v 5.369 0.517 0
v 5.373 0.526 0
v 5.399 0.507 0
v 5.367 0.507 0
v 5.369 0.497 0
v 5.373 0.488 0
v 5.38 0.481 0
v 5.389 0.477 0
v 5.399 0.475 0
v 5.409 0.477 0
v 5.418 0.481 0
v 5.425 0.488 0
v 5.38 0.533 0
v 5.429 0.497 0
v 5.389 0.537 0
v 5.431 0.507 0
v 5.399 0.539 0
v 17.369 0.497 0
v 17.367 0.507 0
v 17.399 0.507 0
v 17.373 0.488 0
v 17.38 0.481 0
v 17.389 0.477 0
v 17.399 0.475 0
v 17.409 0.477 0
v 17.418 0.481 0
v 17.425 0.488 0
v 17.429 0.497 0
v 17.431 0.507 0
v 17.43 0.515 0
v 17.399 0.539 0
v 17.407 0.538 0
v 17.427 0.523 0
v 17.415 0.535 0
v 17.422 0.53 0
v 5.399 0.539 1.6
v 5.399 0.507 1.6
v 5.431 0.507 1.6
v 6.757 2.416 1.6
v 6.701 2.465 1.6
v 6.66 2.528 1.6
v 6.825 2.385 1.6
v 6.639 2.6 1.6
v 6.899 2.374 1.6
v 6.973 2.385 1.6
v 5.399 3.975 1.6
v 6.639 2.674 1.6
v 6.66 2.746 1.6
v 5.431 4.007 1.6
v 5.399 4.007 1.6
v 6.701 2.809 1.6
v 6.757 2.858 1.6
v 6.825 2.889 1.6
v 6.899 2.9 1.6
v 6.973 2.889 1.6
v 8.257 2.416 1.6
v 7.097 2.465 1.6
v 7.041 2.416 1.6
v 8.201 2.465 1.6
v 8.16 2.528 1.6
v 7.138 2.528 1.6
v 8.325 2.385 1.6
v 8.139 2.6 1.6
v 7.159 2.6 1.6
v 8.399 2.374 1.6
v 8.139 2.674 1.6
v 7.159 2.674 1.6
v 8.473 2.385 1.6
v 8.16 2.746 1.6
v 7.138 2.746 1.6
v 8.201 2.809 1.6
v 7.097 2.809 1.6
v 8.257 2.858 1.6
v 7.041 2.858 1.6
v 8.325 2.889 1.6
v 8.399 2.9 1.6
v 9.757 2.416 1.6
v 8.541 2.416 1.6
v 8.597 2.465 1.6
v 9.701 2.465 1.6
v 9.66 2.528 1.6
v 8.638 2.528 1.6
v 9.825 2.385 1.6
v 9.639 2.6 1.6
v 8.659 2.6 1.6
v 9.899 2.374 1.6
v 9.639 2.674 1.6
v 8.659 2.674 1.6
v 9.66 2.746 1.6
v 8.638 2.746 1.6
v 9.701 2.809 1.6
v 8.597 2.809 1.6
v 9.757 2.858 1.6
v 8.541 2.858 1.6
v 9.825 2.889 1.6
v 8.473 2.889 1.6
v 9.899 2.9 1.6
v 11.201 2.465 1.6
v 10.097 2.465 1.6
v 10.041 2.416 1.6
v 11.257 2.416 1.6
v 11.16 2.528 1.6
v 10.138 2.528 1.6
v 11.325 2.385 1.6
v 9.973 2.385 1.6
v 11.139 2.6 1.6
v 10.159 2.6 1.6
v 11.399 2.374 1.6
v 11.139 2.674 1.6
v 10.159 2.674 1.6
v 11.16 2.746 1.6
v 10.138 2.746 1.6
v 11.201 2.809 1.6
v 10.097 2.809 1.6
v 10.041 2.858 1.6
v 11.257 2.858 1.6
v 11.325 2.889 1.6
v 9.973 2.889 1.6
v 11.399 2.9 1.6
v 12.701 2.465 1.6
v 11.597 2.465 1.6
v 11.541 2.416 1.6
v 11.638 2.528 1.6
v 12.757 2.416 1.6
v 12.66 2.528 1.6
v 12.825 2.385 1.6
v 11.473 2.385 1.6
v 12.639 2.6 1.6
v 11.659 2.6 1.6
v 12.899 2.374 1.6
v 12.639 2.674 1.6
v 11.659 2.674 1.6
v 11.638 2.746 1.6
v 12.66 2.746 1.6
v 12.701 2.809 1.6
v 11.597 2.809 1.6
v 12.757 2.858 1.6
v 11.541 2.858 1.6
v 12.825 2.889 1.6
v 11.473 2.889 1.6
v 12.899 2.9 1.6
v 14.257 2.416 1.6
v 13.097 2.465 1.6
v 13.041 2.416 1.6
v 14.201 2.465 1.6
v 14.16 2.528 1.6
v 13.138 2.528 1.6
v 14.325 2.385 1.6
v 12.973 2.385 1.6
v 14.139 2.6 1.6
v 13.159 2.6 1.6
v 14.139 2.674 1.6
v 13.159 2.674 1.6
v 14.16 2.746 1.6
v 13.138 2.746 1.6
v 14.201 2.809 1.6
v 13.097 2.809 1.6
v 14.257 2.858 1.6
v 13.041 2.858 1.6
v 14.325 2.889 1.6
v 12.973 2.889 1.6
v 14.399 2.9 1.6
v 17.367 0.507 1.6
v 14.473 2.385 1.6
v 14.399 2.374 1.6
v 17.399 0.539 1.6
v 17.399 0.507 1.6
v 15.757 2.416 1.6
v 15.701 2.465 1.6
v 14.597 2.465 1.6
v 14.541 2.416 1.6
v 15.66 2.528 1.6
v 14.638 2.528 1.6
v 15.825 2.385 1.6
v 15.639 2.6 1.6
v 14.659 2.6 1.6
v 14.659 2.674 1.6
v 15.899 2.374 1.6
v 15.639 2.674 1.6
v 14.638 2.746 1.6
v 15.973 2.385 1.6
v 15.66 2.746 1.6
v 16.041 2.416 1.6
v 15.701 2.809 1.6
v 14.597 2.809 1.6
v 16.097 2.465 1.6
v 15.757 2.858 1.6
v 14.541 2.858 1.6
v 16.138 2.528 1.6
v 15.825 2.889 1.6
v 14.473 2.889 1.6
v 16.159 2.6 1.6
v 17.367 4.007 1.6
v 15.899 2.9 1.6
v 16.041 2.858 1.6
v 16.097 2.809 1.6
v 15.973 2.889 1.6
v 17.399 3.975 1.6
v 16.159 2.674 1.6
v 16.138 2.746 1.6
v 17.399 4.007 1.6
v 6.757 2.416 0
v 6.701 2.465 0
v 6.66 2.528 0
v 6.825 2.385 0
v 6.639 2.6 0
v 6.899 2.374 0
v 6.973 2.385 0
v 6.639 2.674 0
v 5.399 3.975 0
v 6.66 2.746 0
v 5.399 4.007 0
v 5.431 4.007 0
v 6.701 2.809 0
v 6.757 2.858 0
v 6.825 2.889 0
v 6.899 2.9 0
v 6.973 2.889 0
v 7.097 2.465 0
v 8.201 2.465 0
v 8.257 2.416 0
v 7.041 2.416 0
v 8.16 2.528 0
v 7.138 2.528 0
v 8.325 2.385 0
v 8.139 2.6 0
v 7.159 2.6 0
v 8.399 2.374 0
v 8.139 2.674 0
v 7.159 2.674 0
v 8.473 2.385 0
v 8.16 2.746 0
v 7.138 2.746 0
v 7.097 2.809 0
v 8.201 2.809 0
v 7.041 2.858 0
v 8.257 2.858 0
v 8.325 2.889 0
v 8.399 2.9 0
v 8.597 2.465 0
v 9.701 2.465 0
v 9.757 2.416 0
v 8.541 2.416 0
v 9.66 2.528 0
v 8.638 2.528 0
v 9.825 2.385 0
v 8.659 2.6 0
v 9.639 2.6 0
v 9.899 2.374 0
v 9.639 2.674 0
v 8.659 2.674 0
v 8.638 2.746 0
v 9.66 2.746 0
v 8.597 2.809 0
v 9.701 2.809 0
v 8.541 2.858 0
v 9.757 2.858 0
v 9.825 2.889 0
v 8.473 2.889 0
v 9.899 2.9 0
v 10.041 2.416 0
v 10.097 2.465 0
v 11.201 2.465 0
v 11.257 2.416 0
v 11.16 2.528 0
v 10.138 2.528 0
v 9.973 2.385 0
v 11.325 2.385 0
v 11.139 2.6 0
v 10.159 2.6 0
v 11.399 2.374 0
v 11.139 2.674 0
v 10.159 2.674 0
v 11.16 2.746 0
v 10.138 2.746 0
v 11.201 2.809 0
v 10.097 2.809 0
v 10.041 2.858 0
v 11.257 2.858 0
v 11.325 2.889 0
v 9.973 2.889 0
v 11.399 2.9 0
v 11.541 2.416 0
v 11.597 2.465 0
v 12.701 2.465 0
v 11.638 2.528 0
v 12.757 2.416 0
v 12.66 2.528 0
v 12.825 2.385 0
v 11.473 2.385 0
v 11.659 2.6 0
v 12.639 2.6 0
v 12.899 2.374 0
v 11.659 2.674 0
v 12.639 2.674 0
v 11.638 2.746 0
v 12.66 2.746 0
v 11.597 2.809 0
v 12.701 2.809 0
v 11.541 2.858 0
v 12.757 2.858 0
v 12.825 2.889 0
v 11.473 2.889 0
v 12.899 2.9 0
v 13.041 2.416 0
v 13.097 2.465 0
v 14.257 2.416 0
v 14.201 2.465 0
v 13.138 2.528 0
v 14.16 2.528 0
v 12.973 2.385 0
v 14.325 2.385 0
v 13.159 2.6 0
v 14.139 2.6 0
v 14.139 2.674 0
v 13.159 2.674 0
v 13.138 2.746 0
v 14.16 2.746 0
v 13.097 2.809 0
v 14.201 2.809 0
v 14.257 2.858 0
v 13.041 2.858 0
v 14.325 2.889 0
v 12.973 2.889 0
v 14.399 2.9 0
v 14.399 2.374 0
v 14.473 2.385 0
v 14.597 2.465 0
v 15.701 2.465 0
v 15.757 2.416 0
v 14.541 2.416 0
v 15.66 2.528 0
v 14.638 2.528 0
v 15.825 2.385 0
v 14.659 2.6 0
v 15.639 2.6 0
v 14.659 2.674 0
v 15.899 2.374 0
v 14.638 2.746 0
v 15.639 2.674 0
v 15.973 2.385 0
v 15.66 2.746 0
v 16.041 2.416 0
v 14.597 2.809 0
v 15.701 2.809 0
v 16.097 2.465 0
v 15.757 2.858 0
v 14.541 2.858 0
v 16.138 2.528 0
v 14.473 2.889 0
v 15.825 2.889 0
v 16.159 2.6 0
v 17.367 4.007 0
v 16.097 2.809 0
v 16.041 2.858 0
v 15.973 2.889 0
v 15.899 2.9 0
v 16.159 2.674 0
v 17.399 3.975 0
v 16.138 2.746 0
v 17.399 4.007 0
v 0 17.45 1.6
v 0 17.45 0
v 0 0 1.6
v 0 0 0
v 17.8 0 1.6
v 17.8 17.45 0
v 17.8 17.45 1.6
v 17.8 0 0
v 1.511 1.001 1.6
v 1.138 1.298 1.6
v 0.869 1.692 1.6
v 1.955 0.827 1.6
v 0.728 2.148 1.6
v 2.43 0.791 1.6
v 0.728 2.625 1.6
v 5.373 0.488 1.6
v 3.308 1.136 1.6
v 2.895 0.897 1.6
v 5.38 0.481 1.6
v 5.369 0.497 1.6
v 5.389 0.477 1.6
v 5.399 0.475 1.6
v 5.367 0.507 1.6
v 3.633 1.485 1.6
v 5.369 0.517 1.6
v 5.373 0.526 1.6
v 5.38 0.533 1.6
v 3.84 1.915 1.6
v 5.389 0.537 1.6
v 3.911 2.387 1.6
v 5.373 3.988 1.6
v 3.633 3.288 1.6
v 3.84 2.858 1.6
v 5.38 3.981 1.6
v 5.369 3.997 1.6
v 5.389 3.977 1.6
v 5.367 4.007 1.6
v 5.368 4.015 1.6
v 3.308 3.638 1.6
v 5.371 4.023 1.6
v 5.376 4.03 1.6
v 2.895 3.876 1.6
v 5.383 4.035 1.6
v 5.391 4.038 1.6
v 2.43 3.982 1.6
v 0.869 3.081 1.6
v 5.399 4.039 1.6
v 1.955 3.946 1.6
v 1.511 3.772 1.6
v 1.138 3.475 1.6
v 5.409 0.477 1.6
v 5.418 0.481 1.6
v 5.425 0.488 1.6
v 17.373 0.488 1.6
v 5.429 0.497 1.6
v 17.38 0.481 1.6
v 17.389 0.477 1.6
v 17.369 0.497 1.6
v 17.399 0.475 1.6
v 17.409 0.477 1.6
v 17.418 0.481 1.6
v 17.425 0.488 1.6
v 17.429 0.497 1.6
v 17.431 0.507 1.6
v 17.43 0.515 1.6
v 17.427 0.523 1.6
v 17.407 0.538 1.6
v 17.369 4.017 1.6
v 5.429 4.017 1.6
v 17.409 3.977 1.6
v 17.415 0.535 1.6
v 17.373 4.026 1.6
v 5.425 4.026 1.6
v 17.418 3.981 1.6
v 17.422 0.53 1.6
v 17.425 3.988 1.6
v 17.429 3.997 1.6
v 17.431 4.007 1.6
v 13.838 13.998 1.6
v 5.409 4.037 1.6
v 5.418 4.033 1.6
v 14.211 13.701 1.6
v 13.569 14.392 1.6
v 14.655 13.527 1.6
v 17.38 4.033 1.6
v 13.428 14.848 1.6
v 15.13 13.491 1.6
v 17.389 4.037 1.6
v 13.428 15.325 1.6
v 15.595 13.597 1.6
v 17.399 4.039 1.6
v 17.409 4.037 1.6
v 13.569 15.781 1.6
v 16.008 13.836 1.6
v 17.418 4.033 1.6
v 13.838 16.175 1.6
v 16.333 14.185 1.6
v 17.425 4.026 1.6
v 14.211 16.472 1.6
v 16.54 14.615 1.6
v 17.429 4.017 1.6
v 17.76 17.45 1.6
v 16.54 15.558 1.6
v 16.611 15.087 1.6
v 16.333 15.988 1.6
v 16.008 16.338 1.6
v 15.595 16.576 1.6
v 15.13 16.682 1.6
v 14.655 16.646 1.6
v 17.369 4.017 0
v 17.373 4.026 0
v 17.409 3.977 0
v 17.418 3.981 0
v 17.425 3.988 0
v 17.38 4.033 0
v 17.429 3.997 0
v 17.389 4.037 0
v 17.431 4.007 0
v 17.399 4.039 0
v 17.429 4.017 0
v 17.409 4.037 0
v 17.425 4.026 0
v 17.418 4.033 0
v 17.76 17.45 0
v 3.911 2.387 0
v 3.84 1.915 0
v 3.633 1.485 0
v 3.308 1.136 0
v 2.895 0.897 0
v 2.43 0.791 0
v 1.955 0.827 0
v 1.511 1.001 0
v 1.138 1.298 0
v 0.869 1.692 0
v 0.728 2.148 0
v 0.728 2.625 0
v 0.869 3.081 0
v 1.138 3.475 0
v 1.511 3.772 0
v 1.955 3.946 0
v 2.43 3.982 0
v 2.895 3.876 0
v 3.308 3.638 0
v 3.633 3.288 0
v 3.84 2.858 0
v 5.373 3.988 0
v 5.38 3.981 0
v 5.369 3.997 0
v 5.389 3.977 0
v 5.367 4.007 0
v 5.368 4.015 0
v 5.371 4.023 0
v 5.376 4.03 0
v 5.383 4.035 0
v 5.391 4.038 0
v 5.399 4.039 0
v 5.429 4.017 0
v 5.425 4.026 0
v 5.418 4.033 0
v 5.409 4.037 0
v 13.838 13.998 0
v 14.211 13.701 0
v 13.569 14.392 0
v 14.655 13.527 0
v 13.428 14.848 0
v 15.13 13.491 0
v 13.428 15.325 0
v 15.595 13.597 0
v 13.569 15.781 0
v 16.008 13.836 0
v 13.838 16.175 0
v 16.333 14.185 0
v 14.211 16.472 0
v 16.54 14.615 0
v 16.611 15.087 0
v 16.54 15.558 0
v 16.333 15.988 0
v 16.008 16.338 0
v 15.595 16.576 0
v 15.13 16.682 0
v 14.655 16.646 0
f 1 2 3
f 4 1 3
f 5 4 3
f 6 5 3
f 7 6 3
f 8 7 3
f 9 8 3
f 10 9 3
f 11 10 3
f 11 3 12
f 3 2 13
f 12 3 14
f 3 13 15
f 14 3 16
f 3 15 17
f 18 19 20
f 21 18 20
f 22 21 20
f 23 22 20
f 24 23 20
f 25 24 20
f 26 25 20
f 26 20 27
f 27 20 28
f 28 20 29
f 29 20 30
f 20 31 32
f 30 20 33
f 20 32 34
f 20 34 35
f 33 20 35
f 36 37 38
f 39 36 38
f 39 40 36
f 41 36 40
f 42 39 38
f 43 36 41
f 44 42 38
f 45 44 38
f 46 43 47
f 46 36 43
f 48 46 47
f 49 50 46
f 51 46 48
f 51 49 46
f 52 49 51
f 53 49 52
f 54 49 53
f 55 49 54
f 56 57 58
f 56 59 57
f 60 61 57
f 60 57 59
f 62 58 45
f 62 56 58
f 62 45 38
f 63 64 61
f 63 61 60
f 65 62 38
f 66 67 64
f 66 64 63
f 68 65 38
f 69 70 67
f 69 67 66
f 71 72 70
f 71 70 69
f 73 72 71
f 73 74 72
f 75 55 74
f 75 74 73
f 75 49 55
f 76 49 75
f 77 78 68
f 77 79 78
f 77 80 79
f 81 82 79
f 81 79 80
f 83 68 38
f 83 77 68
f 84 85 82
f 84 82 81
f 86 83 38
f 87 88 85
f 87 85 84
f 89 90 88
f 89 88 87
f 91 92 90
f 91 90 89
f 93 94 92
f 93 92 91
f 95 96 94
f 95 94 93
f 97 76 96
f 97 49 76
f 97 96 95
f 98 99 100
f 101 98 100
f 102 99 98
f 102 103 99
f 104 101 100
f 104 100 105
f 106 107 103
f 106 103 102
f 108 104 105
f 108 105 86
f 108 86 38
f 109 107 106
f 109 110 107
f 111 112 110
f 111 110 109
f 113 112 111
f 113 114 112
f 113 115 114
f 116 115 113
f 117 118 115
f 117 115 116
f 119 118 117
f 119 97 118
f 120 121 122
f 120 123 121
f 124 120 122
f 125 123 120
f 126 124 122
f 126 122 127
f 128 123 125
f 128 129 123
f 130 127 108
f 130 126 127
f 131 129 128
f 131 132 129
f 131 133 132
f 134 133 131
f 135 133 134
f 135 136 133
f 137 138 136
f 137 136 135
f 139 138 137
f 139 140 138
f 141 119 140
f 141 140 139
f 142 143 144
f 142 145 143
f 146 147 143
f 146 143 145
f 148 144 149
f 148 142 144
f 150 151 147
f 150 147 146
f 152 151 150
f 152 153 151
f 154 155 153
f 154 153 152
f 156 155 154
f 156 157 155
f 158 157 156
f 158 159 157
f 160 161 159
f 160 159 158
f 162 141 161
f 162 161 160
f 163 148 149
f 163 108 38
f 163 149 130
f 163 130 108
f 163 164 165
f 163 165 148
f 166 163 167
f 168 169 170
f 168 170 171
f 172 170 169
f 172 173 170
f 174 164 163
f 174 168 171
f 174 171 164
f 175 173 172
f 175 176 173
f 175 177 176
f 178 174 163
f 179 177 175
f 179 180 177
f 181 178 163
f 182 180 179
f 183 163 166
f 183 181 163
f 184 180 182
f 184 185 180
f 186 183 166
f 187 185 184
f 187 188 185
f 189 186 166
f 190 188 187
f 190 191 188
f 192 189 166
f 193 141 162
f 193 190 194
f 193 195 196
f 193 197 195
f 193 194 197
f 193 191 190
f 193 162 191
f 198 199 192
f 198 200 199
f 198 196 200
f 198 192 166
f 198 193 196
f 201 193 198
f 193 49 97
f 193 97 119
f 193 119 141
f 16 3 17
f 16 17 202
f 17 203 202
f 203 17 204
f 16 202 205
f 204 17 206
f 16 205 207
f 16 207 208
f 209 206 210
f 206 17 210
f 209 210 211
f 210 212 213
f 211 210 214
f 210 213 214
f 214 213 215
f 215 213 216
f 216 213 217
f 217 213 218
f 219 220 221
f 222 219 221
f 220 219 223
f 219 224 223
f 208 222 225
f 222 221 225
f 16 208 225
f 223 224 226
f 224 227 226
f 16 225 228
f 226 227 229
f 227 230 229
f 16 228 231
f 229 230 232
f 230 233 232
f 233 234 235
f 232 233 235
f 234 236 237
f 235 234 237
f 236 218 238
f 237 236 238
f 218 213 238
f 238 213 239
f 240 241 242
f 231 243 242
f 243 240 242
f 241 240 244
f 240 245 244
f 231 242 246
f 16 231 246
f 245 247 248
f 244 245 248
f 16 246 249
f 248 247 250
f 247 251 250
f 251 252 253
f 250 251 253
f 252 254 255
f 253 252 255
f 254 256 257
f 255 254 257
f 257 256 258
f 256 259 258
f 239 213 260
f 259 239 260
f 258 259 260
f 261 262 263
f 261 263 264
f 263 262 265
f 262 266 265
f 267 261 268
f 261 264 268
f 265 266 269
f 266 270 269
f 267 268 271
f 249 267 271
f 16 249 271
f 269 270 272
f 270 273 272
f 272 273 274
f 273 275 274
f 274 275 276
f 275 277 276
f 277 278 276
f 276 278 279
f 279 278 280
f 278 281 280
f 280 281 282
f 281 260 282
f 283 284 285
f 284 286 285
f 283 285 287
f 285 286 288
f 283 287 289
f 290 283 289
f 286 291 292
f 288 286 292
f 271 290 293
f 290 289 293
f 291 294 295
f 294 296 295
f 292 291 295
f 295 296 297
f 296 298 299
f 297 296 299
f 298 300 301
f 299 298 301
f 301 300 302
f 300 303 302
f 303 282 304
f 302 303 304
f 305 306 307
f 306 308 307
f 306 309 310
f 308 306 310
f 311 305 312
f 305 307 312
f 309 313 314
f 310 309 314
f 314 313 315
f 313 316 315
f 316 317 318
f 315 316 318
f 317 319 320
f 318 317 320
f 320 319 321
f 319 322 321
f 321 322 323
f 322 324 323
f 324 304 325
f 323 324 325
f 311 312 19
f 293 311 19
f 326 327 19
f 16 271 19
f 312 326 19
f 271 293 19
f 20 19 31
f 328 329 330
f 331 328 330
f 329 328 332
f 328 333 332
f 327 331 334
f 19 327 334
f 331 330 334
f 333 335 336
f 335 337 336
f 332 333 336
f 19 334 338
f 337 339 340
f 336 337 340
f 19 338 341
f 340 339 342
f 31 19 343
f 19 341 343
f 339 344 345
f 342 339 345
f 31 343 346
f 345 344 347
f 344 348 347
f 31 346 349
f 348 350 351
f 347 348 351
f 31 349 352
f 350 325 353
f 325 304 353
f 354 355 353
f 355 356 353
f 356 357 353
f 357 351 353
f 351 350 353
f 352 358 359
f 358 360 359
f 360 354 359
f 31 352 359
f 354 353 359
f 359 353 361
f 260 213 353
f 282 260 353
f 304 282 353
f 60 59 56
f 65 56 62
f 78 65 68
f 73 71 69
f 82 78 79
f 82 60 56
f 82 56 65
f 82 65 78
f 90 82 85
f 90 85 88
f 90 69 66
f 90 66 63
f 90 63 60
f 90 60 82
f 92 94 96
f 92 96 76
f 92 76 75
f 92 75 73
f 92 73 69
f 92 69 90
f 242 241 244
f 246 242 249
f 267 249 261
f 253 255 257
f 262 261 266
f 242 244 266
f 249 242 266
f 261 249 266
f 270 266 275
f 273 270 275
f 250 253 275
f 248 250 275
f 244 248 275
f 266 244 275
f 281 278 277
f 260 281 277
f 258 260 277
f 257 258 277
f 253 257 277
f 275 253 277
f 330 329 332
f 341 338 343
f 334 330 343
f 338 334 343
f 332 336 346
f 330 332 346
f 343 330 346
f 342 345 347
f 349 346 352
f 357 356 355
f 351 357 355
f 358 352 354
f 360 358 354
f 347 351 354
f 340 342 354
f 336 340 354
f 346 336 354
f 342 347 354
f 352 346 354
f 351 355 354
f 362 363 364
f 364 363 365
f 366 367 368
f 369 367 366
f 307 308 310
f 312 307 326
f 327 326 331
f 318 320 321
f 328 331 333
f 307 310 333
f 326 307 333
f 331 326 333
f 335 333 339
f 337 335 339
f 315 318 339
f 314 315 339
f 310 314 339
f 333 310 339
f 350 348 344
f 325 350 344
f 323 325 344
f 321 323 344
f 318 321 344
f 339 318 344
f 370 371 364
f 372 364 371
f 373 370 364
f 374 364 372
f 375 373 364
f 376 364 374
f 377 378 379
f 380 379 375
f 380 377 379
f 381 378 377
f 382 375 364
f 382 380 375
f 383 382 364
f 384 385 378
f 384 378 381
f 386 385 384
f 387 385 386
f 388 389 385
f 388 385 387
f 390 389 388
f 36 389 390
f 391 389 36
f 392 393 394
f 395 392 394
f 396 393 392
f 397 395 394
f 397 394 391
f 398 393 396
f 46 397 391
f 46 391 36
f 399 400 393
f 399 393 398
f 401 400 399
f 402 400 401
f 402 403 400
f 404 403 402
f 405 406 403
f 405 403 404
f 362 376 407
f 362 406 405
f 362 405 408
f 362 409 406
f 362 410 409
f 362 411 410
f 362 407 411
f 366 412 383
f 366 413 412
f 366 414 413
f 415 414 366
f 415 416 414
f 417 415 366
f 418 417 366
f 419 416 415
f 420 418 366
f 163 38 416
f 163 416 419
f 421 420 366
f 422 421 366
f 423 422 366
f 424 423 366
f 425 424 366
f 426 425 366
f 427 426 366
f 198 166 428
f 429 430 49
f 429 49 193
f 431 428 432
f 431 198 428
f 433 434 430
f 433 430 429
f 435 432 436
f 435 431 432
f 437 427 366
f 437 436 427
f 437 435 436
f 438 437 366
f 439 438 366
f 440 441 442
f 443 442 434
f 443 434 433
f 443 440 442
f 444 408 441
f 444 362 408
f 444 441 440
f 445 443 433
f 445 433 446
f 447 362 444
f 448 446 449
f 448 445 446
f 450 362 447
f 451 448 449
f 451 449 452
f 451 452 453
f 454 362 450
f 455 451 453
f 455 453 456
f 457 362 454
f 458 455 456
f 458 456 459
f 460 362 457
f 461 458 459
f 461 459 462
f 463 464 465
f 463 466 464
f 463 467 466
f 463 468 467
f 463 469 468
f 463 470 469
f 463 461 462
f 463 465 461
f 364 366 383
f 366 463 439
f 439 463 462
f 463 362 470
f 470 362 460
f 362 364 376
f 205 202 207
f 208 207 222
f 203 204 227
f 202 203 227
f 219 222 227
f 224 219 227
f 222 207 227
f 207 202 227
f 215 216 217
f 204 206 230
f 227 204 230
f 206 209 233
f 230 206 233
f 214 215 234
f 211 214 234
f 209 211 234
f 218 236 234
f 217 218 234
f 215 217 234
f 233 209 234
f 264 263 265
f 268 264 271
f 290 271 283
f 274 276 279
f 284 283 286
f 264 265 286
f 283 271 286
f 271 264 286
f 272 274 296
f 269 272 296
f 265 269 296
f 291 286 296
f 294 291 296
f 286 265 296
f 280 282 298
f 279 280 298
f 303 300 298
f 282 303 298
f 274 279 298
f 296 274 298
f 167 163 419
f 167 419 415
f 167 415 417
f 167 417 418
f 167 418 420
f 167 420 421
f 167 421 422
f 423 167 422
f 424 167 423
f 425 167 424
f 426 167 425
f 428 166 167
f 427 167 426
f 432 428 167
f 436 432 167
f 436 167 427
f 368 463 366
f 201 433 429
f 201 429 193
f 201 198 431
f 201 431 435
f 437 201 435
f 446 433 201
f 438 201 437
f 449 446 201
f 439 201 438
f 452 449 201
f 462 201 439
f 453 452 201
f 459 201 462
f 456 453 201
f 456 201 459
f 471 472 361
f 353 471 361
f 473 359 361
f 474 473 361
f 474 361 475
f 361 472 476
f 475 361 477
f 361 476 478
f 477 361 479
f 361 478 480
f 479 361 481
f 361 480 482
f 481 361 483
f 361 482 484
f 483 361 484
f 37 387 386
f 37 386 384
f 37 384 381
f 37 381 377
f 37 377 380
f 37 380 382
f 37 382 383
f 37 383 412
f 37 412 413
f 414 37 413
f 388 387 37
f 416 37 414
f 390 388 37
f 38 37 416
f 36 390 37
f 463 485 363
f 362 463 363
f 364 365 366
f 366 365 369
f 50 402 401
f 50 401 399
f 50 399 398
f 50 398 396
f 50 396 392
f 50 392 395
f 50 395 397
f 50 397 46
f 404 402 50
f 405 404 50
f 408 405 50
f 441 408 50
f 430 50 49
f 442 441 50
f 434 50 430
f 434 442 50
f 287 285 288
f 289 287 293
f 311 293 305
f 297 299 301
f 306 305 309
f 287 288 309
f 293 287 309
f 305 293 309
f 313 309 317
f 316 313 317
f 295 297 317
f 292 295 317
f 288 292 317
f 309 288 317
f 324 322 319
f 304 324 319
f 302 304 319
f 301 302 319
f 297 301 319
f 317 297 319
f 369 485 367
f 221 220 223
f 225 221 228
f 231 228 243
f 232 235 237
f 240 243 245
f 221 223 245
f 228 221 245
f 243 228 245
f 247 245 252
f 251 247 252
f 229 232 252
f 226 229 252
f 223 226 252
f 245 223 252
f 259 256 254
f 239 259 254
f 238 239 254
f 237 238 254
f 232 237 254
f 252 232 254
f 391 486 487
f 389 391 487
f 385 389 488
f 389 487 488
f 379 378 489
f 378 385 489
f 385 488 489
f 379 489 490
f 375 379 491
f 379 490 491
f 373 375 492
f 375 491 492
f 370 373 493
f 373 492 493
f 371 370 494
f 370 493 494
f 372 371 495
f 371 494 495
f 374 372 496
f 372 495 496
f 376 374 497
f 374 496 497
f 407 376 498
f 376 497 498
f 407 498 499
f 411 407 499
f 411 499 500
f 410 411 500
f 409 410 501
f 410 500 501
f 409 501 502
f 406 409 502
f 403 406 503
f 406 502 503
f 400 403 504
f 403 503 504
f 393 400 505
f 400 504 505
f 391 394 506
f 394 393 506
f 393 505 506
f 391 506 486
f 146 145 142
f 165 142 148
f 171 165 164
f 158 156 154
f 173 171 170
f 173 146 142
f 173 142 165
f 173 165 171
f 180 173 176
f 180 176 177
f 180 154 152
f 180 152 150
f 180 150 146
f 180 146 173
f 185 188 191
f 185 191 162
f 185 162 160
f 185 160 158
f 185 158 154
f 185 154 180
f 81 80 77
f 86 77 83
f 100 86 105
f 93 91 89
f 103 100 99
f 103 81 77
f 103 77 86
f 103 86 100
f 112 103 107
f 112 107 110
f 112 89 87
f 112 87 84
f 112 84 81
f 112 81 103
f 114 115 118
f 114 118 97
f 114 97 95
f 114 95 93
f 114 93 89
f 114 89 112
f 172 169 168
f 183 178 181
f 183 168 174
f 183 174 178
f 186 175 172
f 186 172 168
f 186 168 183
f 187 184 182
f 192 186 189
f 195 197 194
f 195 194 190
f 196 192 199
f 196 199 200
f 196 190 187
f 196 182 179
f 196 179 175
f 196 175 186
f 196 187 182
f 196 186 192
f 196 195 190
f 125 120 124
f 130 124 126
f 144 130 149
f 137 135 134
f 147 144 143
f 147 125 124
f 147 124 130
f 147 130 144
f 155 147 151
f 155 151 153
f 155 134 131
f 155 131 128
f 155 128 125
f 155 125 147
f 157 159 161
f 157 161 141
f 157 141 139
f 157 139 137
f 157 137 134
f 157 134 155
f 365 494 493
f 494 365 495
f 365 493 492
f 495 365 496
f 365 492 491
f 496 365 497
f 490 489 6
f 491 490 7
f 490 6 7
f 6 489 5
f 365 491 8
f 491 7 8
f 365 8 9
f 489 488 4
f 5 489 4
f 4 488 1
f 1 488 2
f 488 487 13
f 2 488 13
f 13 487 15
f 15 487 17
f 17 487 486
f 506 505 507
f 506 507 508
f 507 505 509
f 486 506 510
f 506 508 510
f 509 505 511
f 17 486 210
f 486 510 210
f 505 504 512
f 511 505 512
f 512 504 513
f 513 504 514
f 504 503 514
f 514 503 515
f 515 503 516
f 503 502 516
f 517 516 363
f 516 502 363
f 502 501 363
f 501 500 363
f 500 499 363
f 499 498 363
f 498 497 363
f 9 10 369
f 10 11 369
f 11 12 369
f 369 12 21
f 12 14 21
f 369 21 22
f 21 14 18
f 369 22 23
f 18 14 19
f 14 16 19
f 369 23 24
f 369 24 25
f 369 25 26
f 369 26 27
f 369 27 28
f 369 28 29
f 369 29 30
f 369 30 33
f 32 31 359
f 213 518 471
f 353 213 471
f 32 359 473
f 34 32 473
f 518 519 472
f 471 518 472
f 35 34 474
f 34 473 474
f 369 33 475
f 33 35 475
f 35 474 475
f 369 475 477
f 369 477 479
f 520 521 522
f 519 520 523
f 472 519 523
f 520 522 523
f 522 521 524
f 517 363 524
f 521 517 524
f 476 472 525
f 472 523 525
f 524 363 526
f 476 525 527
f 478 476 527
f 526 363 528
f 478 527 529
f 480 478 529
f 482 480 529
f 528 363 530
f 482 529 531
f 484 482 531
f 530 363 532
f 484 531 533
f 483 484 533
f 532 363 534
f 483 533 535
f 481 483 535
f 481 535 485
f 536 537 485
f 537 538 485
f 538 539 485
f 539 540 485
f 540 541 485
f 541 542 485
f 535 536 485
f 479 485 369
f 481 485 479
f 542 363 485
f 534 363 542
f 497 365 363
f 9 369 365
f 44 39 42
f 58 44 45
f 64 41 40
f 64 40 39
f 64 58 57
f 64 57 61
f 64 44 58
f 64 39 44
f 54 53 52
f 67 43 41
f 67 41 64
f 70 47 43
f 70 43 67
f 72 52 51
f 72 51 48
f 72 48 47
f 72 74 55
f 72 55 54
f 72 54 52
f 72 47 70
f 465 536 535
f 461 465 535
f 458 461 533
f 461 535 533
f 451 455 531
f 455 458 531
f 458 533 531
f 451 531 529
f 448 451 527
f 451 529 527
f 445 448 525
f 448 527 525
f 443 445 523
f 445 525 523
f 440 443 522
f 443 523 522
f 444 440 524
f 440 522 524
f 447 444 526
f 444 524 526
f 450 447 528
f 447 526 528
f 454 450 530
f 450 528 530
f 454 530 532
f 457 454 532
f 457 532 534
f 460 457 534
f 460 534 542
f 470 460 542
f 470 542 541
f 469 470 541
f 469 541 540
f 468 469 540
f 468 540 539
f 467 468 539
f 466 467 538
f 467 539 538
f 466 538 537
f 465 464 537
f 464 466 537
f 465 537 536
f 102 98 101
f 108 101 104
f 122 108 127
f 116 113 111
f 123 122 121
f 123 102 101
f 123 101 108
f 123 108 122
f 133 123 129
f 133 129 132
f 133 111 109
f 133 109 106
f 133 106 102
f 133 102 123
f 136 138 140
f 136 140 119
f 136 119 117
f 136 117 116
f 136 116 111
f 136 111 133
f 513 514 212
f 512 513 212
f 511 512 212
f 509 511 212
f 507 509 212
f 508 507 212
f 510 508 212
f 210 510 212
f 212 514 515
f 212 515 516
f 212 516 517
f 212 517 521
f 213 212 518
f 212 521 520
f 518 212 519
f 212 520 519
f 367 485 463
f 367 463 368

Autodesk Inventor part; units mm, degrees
ref_plane "YZ Plane" through (0, 0, 0) normal (1, 0, 0) x (0, 1, 0)
ref_plane "XZ Plane" through (0, 0, 0) normal (0, 1, 0) x (-1, 0, 0)
ref_plane "XY Plane" through (0, 0, 0) normal (0, 0, 1) x (1, 0, 0)
sketch "スケッチ1" plane through (0, 0, 0) normal (0, 0, 1) x (1, 0, 0)
  line L0 (0, 0) -> (17.8, 0)
  line L1 (17.8, 0) -> (17.76, 17.45)
  line L2 (17.76, 17.45) -> (0, 17.45)
  line L3 (0, 17.45) -> (0, 0)
  line L4 (17.399, 4.007) -> (5.399, 4.007)
  arc A0 (5.399, 4.0388) -> (5.399, 3.9753) centre (5.399, 4.007) ccw
  arc A1 (17.399, 3.9753) -> (17.399, 4.0388) centre (17.399, 4.007) ccw
  line L5 (5.399, 4.007) -> (5.399, 0.507)
  arc A2 (5.3673, 0.507) -> (5.4307, 0.507) centre (5.399, 0.507) ccw
  arc A3 (5.4307, 4.007) -> (5.3673, 4.007) centre (5.399, 4.007) ccw
  line L6 (5.399, 0.507) -> (17.399, 0.507)
  arc A4 (17.399, 0.4753) -> (17.399, 0.5388) centre (17.399, 0.5071) ccw
  arc A5 (5.399, 0.5388) -> (5.399, 0.4753) centre (5.399, 0.5071) ccw
  line L7 (17.399, 0.507) -> (17.399, 4.007)
  arc A6 (17.4307, 4.007) -> (17.3673, 4.007) centre (17.399, 4.007) ccw
  arc A7 (17.3673, 0.507) -> (17.4307, 0.507) centre (17.399, 0.507) ccw
  arc A8 (6.899, 2.8995) -> (6.899, 2.3745) centre (6.899, 2.637) ccw
  arc A9 (6.899, 2.3745) -> (6.899, 2.8995) centre (6.899, 2.637) ccw
  arc A10 (6.899, 2.8995) -> (6.899, 2.3745) centre (6.899, 2.637) ccw
  arc A11 (6.899, 2.3745) -> (6.899, 2.8995) centre (6.899, 2.637) ccw
  arc A12 (8.399, 2.8995) -> (8.399, 2.3745) centre (8.399, 2.637) ccw
  arc A13 (8.399, 2.3745) -> (8.399, 2.8995) centre (8.399, 2.637) ccw
  arc A14 (8.399, 2.8995) -> (8.399, 2.3745) centre (8.399, 2.637) ccw
  arc A15 (8.399, 2.3745) -> (8.399, 2.8995) centre (8.399, 2.637) ccw
  arc A16 (9.899, 2.8995) -> (9.899, 2.3745) centre (9.899, 2.637) ccw
  arc A17 (9.899, 2.3745) -> (9.899, 2.8995) centre (9.899, 2.637) ccw
  arc A18 (9.899, 2.8995) -> (9.899, 2.3745) centre (9.899, 2.637) ccw
  arc A19 (9.899, 2.3745) -> (9.899, 2.8995) centre (9.899, 2.637) ccw
  arc A20 (11.399, 2.8995) -> (11.399, 2.3745) centre (11.399, 2.637) ccw
  arc A21 (11.399, 2.3745) -> (11.399, 2.8995) centre (11.399, 2.637) ccw
  arc A22 (11.399, 2.8995) -> (11.399, 2.3745) centre (11.399, 2.637) ccw
  arc A23 (11.399, 2.3745) -> (11.399, 2.8995) centre (11.399, 2.637) ccw
  arc A24 (12.899, 2.8995) -> (12.899, 2.3745) centre (12.899, 2.637) ccw
  arc A25 (12.899, 2.3745) -> (12.899, 2.8995) centre (12.899, 2.637) ccw
  arc A26 (12.899, 2.8995) -> (12.899, 2.3745) centre (12.899, 2.637) ccw
  arc A27 (12.899, 2.3745) -> (12.899, 2.8995) centre (12.899, 2.637) ccw
  arc A28 (14.399, 2.8995) -> (14.399, 2.3745) centre (14.399, 2.637) ccw
  arc A29 (14.399, 2.3745) -> (14.399, 2.8995) centre (14.399, 2.637) ccw
  arc A30 (14.399, 2.8995) -> (14.399, 2.3745) centre (14.399, 2.637) ccw
  arc A31 (14.399, 2.3745) -> (14.399, 2.8995) centre (14.399, 2.637) ccw
  arc A32 (15.899, 2.8995) -> (15.899, 2.3745) centre (15.899, 2.637) ccw
  arc A33 (15.899, 2.3745) -> (15.899, 2.8995) centre (15.899, 2.637) ccw
  arc A34 (15.899, 2.8995) -> (15.899, 2.3745) centre (15.899, 2.637) ccw
  arc A35 (15.899, 2.3745) -> (15.899, 2.8995) centre (15.899, 2.637) ccw
  line L8 (0, 17.45) -> (17.8, 17.45)
  line L9 (17.8, 17.45) -> (17.8, 0)
  line L10 (17.8, 0) -> (0, 0)
  line L11 (0, 0) -> (0, 17.45)
  circle A36 centre (15.0106, 15.0866) radius 1.6
  circle A37 centre (2.3106, 2.3866) radius 1.6
  dimension "d0" = 3.2
  dimension "d1" = 3.2
  dimension "d2" = 12.7
  dimension "d3" = 12.7
extrude "押し出し1" add sketch "スケッチ1" along normal blind 1.6 contours L3 L2 L1 L0 | L1 L8 L9 | L7 L6 L5 L4 | L4 A6 A1 L7 | L4 L5 A0 A3 | A4 A7 L6 L7 | L5 L6 A2 A5 | A9 A8 | A13 A12 | A17 A16 | A21 A20 | A25 A24 | A29 A28 | A33 A32
sketch "スケッチ2" plane through (0, 0, 1.6) normal (0, 0, 1) x (1, 0, 0)
  line L0 (4.476, 11.19) -> (11.1005, 11.19) construction
  line L1 (11.1005, 11.19) -> (11.1005, 8.2657) construction
  line L2 (11.1005, 8.2657) -> (4.476, 8.2657) construction
  line L3 (4.476, 8.2657) -> (4.476, 11.19) construction
  point P0 (0, 0)
sketch "スケッチ3" plane through (0, 0, 0) normal (0, 0, -1) x (-1, 0, 0)
  line L0 (-15.9942, 10.8916) -> (2.8001, 10.8916) construction
  line L1 (2.8001, 10.8916) -> (2.8001, 7.6653) construction
  line L2 (2.8001, 7.6653) -> (-15.9942, 7.6653) construction
  line L3 (-15.9942, 7.6653) -> (-15.9942, 10.8916) construction
  line L4 (-17.4862, 3.551) -> (-6.147, 3.551)
  line L5 (-6.147, 3.551) -> (-6.147, 0.3282)
  line L6 (-6.147, 0.3282) -> (-17.4862, 0.3282)
  line L7 (-17.4862, 0.3282) -> (-17.4862, 3.551)
  point P0 (0, 0)
properties part number "Color"
